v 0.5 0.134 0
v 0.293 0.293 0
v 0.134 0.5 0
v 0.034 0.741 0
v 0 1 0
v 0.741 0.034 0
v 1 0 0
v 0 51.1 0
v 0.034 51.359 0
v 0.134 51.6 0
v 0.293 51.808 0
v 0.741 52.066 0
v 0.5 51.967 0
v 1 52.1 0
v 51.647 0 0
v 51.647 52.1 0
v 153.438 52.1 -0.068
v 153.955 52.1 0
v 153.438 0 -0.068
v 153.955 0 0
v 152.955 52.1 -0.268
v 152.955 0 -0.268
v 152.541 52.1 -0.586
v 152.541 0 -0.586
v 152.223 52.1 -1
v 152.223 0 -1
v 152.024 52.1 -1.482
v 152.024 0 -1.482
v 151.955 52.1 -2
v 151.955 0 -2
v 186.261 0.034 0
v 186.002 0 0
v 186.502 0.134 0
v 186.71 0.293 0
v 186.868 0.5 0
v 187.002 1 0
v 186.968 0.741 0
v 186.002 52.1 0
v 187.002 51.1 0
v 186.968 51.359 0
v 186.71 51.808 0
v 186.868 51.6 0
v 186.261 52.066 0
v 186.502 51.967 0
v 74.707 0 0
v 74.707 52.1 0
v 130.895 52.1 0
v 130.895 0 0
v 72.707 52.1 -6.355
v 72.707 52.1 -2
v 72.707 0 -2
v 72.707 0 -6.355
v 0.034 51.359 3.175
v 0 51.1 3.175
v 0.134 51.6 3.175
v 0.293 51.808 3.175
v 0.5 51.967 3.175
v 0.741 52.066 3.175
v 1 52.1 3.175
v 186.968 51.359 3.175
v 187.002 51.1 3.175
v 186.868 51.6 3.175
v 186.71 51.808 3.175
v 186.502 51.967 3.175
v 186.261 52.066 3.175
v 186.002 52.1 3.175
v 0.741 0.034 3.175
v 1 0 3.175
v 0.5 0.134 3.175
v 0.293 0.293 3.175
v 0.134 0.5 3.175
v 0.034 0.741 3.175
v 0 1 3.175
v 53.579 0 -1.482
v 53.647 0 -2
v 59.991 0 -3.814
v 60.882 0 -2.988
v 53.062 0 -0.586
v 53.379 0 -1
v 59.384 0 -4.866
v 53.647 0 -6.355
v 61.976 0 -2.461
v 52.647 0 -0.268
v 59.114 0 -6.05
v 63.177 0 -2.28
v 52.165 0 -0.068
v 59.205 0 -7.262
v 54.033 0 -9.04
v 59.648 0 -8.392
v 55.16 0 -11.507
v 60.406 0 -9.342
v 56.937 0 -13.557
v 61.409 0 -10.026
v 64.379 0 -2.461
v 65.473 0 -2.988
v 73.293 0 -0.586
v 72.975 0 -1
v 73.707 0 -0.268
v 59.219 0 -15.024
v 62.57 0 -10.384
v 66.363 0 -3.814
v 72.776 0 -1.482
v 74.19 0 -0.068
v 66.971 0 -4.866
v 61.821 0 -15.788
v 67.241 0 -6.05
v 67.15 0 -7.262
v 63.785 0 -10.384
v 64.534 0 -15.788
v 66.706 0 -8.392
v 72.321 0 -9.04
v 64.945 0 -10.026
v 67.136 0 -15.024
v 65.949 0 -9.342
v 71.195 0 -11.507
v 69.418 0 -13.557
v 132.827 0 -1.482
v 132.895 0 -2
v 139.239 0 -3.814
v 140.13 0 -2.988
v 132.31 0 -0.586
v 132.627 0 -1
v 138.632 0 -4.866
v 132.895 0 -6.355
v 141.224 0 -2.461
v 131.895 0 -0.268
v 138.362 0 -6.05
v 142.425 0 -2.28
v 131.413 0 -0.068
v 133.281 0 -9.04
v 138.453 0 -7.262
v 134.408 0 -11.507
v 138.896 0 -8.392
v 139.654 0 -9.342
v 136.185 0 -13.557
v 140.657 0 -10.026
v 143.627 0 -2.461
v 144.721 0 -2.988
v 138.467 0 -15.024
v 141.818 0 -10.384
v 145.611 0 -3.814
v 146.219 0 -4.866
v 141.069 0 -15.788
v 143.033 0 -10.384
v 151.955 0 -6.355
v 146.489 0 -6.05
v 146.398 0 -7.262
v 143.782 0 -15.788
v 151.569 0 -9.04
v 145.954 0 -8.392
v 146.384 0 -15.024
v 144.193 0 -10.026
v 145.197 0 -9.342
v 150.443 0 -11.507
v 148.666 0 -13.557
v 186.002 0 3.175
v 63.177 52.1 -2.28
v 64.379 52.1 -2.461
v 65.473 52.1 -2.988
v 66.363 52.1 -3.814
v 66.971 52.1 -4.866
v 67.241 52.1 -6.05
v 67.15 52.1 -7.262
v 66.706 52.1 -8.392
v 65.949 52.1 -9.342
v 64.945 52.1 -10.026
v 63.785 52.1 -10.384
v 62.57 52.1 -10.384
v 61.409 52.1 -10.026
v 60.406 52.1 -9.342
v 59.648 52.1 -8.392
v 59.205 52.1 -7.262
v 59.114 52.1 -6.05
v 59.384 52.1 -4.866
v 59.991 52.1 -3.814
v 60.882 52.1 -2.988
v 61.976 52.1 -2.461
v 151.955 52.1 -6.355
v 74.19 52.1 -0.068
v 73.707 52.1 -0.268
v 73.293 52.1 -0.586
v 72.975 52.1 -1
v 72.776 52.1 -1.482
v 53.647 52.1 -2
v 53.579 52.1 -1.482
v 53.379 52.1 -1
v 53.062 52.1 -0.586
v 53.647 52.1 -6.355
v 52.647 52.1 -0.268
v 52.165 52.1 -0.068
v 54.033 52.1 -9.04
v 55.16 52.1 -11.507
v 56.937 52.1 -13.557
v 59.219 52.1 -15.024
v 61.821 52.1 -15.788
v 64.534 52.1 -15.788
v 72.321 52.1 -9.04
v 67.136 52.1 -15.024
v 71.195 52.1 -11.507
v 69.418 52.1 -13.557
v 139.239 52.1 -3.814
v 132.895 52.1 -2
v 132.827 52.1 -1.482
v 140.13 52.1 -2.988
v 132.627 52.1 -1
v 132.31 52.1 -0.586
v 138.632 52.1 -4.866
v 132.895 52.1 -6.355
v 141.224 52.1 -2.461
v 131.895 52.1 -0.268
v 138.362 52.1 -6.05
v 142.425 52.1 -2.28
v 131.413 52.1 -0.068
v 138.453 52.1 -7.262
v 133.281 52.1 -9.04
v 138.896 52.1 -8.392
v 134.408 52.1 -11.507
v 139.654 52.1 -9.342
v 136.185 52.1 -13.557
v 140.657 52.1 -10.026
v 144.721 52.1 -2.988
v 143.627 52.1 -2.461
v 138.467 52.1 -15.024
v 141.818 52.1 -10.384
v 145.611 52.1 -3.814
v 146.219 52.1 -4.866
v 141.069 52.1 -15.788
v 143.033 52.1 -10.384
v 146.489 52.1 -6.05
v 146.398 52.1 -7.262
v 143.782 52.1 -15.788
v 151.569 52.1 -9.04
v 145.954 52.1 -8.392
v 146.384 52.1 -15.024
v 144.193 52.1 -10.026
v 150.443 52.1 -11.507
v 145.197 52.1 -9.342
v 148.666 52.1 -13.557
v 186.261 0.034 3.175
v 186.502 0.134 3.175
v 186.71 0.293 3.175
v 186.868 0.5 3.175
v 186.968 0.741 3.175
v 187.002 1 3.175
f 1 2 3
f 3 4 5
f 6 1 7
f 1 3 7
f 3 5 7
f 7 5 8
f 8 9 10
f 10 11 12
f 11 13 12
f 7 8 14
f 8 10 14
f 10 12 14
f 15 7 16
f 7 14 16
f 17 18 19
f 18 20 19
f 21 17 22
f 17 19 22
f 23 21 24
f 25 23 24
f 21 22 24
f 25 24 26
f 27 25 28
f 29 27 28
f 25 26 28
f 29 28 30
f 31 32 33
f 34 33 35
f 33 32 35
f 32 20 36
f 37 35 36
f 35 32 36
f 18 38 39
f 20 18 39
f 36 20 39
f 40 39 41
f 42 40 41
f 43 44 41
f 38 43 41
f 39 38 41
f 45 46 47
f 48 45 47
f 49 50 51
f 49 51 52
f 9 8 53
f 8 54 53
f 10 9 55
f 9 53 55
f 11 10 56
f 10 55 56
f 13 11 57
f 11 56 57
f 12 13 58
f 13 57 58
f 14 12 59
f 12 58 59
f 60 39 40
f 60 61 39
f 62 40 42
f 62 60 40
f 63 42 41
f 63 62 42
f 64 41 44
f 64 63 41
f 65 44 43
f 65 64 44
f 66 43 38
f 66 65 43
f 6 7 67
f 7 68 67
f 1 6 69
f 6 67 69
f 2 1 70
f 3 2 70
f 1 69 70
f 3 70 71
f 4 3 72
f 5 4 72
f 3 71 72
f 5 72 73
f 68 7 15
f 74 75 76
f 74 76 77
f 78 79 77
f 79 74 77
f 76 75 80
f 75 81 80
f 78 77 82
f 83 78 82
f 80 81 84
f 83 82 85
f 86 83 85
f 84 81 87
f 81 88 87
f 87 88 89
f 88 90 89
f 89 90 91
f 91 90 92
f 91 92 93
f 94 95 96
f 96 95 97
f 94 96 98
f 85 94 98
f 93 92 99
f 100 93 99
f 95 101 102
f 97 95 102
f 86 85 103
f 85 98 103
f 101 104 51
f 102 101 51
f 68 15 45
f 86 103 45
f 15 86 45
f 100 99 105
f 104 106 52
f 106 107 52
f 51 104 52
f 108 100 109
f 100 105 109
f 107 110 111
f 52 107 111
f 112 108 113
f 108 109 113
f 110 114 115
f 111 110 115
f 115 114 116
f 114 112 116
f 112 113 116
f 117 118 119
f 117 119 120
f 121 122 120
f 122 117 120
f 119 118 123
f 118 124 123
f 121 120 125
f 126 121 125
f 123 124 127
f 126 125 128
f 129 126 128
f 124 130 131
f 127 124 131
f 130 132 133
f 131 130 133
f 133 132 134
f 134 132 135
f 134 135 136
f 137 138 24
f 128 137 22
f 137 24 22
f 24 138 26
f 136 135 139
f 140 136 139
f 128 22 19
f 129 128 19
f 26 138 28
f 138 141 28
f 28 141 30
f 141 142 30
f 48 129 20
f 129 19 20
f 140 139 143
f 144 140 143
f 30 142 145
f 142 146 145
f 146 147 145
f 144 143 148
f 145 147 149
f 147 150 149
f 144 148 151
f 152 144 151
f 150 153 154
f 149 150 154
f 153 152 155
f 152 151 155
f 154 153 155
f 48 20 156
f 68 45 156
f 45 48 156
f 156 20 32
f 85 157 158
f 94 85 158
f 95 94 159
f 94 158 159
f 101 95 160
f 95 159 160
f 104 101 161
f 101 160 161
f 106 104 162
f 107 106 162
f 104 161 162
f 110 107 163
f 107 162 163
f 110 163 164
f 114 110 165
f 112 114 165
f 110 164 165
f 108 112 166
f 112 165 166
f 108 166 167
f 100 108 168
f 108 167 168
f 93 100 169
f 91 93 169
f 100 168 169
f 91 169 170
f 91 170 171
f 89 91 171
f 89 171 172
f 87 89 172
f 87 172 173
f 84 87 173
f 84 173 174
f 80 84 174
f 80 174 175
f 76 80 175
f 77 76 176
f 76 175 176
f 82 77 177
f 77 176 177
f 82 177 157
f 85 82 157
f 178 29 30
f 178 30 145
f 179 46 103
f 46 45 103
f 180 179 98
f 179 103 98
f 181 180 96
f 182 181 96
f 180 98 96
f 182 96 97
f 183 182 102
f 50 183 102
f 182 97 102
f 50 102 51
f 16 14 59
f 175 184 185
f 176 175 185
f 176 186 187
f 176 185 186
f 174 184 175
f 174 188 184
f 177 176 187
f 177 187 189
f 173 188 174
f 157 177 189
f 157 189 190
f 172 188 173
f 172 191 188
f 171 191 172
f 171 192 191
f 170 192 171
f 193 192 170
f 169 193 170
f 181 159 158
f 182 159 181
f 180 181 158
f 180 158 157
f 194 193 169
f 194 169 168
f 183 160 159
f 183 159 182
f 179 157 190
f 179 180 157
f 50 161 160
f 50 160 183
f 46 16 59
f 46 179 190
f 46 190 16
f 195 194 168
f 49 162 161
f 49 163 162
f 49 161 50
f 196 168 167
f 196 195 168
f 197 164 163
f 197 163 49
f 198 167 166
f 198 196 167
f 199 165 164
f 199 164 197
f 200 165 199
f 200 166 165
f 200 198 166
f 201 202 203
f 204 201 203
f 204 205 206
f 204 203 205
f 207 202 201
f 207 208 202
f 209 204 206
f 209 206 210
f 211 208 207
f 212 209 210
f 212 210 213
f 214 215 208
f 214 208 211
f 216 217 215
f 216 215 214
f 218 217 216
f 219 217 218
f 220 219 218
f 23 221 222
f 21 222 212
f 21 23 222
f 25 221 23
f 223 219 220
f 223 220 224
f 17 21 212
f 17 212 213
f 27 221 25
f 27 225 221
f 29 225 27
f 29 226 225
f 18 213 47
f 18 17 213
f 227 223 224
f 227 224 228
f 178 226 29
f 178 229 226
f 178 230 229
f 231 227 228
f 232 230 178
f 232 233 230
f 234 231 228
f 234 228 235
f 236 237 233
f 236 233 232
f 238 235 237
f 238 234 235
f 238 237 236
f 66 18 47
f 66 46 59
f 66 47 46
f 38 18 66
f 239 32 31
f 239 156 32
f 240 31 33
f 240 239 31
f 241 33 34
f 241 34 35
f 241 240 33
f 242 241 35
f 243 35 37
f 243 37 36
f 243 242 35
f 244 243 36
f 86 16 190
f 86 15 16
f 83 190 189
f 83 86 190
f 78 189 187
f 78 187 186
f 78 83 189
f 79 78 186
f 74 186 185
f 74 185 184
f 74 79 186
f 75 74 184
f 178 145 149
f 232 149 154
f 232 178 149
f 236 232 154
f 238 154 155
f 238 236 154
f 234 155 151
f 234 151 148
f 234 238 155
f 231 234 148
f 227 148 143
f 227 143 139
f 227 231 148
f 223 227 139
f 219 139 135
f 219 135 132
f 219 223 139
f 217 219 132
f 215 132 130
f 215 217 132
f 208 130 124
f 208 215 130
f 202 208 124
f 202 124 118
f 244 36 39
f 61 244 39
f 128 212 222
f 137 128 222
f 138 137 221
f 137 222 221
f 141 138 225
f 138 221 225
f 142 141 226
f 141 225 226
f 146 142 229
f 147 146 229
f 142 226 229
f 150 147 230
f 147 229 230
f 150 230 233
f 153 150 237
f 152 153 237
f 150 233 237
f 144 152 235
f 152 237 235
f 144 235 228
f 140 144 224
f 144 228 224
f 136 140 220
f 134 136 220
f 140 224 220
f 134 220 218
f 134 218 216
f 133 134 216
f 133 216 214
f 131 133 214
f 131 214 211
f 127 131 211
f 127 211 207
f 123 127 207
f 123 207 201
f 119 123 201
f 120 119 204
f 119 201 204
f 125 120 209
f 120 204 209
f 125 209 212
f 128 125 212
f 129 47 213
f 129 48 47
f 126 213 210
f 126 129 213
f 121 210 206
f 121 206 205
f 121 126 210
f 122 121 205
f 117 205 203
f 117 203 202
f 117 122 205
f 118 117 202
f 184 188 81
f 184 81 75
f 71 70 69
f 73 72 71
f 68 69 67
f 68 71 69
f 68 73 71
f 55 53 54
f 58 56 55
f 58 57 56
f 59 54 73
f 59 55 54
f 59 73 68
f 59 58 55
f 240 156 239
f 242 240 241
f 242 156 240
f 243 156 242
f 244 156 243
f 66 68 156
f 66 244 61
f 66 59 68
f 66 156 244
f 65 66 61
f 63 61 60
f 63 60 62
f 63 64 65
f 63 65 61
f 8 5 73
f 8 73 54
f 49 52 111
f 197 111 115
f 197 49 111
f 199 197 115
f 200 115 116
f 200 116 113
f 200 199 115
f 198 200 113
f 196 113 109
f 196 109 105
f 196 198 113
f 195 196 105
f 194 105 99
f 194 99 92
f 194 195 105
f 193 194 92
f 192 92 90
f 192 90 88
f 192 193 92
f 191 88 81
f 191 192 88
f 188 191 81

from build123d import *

# Parameters (mm, degrees)
SKETCH2_W           = 187.00242
SKETCH2_H           = 52.10048
BOSS_EXTRUDE1_DEPTH = 3.175
SKETCH4_R           = 4.074999978
BOSS_EXTRUDE2_DEPTH = 52.10048
FILLET1_R           = 2
FILLET2_R           = 1


with BuildPart() as part:
    # Sketch2 → Boss-Extrude1 (new body)
    with BuildSketch(Plane.XY):
        with Locations((93.50121, 26.05024)):
            Rectangle(SKETCH2_W, SKETCH2_H)
    extrude(amount=BOSS_EXTRUDE1_DEPTH)

    # Sketch4 → Boss-Extrude2 (add, through all)
    # profile 1 of 2: a face of its own
    with BuildSketch(Plane(origin=(0, 52.10048, 0), x_dir=(1, 0, 0), z_dir=(0, 1, 0))):
        with BuildLine():
            Line((53.64742001, 0), (72.70741999, 0))
            Line((72.70741999, 0), (72.70741999, 6.35499999))
            ThreePointArc((72.70741999, 6.35499999), (63.17742, 15.88499998), (53.64742001, 6.35499999))
            Line((53.64742001, 6.35499999), (53.64742001, 0))
        make_face()
        with Locations(Location((63.17742, 6.35499999, 0), (0, 0, 270))):
            Circle(SKETCH4_R, mode=Mode.SUBTRACT)
    # profile 2 of 2: a face of its own
    with BuildSketch(Plane(origin=(0, 52.10048, 0), x_dir=(1, 0, 0), z_dir=(0, 1, 0))):
        with BuildLine():
            Line((132.89542001, 6.35499999), (132.89542001, 0))
            Line((132.89542001, 0), (151.95541999, 0))
            Line((151.95541999, 0), (151.95541999, 6.35499999))
            ThreePointArc((151.95541999, 6.35499999), (142.42542, 15.88499998), (132.89542001, 6.35499999))
        make_face()
        with Locations(Location((142.42542, 6.35499999, 0), (0, 0, 270))):
            Circle(SKETCH4_R, mode=Mode.SUBTRACT)
    extrude(amount=-BOSS_EXTRUDE2_DEPTH)

    # Fillet1
    fillet1_edges = [part.edges().sort_by_distance(p)[0] for p in [
        (72.70741999, 26.05024, 0),
        (53.64742001, 26.05024, 0),
        (151.95541999, 26.05024, 0),
        (132.89542001, 26.05024, 0),
    ]]
    fillet(fillet1_edges, radius=FILLET1_R)

    # Fillet2
    fillet2_edges = [part.edges().sort_by_distance(p)[0] for p in [
        (0, 52.10048, 1.5875),
        (187.00242, 52.10048, 1.5875),
        (187.00242, 0, 1.5875),
        (0, 0, 1.5875),
    ]]
    fillet(fillet2_edges, radius=FILLET2_R)


solid = part.part
